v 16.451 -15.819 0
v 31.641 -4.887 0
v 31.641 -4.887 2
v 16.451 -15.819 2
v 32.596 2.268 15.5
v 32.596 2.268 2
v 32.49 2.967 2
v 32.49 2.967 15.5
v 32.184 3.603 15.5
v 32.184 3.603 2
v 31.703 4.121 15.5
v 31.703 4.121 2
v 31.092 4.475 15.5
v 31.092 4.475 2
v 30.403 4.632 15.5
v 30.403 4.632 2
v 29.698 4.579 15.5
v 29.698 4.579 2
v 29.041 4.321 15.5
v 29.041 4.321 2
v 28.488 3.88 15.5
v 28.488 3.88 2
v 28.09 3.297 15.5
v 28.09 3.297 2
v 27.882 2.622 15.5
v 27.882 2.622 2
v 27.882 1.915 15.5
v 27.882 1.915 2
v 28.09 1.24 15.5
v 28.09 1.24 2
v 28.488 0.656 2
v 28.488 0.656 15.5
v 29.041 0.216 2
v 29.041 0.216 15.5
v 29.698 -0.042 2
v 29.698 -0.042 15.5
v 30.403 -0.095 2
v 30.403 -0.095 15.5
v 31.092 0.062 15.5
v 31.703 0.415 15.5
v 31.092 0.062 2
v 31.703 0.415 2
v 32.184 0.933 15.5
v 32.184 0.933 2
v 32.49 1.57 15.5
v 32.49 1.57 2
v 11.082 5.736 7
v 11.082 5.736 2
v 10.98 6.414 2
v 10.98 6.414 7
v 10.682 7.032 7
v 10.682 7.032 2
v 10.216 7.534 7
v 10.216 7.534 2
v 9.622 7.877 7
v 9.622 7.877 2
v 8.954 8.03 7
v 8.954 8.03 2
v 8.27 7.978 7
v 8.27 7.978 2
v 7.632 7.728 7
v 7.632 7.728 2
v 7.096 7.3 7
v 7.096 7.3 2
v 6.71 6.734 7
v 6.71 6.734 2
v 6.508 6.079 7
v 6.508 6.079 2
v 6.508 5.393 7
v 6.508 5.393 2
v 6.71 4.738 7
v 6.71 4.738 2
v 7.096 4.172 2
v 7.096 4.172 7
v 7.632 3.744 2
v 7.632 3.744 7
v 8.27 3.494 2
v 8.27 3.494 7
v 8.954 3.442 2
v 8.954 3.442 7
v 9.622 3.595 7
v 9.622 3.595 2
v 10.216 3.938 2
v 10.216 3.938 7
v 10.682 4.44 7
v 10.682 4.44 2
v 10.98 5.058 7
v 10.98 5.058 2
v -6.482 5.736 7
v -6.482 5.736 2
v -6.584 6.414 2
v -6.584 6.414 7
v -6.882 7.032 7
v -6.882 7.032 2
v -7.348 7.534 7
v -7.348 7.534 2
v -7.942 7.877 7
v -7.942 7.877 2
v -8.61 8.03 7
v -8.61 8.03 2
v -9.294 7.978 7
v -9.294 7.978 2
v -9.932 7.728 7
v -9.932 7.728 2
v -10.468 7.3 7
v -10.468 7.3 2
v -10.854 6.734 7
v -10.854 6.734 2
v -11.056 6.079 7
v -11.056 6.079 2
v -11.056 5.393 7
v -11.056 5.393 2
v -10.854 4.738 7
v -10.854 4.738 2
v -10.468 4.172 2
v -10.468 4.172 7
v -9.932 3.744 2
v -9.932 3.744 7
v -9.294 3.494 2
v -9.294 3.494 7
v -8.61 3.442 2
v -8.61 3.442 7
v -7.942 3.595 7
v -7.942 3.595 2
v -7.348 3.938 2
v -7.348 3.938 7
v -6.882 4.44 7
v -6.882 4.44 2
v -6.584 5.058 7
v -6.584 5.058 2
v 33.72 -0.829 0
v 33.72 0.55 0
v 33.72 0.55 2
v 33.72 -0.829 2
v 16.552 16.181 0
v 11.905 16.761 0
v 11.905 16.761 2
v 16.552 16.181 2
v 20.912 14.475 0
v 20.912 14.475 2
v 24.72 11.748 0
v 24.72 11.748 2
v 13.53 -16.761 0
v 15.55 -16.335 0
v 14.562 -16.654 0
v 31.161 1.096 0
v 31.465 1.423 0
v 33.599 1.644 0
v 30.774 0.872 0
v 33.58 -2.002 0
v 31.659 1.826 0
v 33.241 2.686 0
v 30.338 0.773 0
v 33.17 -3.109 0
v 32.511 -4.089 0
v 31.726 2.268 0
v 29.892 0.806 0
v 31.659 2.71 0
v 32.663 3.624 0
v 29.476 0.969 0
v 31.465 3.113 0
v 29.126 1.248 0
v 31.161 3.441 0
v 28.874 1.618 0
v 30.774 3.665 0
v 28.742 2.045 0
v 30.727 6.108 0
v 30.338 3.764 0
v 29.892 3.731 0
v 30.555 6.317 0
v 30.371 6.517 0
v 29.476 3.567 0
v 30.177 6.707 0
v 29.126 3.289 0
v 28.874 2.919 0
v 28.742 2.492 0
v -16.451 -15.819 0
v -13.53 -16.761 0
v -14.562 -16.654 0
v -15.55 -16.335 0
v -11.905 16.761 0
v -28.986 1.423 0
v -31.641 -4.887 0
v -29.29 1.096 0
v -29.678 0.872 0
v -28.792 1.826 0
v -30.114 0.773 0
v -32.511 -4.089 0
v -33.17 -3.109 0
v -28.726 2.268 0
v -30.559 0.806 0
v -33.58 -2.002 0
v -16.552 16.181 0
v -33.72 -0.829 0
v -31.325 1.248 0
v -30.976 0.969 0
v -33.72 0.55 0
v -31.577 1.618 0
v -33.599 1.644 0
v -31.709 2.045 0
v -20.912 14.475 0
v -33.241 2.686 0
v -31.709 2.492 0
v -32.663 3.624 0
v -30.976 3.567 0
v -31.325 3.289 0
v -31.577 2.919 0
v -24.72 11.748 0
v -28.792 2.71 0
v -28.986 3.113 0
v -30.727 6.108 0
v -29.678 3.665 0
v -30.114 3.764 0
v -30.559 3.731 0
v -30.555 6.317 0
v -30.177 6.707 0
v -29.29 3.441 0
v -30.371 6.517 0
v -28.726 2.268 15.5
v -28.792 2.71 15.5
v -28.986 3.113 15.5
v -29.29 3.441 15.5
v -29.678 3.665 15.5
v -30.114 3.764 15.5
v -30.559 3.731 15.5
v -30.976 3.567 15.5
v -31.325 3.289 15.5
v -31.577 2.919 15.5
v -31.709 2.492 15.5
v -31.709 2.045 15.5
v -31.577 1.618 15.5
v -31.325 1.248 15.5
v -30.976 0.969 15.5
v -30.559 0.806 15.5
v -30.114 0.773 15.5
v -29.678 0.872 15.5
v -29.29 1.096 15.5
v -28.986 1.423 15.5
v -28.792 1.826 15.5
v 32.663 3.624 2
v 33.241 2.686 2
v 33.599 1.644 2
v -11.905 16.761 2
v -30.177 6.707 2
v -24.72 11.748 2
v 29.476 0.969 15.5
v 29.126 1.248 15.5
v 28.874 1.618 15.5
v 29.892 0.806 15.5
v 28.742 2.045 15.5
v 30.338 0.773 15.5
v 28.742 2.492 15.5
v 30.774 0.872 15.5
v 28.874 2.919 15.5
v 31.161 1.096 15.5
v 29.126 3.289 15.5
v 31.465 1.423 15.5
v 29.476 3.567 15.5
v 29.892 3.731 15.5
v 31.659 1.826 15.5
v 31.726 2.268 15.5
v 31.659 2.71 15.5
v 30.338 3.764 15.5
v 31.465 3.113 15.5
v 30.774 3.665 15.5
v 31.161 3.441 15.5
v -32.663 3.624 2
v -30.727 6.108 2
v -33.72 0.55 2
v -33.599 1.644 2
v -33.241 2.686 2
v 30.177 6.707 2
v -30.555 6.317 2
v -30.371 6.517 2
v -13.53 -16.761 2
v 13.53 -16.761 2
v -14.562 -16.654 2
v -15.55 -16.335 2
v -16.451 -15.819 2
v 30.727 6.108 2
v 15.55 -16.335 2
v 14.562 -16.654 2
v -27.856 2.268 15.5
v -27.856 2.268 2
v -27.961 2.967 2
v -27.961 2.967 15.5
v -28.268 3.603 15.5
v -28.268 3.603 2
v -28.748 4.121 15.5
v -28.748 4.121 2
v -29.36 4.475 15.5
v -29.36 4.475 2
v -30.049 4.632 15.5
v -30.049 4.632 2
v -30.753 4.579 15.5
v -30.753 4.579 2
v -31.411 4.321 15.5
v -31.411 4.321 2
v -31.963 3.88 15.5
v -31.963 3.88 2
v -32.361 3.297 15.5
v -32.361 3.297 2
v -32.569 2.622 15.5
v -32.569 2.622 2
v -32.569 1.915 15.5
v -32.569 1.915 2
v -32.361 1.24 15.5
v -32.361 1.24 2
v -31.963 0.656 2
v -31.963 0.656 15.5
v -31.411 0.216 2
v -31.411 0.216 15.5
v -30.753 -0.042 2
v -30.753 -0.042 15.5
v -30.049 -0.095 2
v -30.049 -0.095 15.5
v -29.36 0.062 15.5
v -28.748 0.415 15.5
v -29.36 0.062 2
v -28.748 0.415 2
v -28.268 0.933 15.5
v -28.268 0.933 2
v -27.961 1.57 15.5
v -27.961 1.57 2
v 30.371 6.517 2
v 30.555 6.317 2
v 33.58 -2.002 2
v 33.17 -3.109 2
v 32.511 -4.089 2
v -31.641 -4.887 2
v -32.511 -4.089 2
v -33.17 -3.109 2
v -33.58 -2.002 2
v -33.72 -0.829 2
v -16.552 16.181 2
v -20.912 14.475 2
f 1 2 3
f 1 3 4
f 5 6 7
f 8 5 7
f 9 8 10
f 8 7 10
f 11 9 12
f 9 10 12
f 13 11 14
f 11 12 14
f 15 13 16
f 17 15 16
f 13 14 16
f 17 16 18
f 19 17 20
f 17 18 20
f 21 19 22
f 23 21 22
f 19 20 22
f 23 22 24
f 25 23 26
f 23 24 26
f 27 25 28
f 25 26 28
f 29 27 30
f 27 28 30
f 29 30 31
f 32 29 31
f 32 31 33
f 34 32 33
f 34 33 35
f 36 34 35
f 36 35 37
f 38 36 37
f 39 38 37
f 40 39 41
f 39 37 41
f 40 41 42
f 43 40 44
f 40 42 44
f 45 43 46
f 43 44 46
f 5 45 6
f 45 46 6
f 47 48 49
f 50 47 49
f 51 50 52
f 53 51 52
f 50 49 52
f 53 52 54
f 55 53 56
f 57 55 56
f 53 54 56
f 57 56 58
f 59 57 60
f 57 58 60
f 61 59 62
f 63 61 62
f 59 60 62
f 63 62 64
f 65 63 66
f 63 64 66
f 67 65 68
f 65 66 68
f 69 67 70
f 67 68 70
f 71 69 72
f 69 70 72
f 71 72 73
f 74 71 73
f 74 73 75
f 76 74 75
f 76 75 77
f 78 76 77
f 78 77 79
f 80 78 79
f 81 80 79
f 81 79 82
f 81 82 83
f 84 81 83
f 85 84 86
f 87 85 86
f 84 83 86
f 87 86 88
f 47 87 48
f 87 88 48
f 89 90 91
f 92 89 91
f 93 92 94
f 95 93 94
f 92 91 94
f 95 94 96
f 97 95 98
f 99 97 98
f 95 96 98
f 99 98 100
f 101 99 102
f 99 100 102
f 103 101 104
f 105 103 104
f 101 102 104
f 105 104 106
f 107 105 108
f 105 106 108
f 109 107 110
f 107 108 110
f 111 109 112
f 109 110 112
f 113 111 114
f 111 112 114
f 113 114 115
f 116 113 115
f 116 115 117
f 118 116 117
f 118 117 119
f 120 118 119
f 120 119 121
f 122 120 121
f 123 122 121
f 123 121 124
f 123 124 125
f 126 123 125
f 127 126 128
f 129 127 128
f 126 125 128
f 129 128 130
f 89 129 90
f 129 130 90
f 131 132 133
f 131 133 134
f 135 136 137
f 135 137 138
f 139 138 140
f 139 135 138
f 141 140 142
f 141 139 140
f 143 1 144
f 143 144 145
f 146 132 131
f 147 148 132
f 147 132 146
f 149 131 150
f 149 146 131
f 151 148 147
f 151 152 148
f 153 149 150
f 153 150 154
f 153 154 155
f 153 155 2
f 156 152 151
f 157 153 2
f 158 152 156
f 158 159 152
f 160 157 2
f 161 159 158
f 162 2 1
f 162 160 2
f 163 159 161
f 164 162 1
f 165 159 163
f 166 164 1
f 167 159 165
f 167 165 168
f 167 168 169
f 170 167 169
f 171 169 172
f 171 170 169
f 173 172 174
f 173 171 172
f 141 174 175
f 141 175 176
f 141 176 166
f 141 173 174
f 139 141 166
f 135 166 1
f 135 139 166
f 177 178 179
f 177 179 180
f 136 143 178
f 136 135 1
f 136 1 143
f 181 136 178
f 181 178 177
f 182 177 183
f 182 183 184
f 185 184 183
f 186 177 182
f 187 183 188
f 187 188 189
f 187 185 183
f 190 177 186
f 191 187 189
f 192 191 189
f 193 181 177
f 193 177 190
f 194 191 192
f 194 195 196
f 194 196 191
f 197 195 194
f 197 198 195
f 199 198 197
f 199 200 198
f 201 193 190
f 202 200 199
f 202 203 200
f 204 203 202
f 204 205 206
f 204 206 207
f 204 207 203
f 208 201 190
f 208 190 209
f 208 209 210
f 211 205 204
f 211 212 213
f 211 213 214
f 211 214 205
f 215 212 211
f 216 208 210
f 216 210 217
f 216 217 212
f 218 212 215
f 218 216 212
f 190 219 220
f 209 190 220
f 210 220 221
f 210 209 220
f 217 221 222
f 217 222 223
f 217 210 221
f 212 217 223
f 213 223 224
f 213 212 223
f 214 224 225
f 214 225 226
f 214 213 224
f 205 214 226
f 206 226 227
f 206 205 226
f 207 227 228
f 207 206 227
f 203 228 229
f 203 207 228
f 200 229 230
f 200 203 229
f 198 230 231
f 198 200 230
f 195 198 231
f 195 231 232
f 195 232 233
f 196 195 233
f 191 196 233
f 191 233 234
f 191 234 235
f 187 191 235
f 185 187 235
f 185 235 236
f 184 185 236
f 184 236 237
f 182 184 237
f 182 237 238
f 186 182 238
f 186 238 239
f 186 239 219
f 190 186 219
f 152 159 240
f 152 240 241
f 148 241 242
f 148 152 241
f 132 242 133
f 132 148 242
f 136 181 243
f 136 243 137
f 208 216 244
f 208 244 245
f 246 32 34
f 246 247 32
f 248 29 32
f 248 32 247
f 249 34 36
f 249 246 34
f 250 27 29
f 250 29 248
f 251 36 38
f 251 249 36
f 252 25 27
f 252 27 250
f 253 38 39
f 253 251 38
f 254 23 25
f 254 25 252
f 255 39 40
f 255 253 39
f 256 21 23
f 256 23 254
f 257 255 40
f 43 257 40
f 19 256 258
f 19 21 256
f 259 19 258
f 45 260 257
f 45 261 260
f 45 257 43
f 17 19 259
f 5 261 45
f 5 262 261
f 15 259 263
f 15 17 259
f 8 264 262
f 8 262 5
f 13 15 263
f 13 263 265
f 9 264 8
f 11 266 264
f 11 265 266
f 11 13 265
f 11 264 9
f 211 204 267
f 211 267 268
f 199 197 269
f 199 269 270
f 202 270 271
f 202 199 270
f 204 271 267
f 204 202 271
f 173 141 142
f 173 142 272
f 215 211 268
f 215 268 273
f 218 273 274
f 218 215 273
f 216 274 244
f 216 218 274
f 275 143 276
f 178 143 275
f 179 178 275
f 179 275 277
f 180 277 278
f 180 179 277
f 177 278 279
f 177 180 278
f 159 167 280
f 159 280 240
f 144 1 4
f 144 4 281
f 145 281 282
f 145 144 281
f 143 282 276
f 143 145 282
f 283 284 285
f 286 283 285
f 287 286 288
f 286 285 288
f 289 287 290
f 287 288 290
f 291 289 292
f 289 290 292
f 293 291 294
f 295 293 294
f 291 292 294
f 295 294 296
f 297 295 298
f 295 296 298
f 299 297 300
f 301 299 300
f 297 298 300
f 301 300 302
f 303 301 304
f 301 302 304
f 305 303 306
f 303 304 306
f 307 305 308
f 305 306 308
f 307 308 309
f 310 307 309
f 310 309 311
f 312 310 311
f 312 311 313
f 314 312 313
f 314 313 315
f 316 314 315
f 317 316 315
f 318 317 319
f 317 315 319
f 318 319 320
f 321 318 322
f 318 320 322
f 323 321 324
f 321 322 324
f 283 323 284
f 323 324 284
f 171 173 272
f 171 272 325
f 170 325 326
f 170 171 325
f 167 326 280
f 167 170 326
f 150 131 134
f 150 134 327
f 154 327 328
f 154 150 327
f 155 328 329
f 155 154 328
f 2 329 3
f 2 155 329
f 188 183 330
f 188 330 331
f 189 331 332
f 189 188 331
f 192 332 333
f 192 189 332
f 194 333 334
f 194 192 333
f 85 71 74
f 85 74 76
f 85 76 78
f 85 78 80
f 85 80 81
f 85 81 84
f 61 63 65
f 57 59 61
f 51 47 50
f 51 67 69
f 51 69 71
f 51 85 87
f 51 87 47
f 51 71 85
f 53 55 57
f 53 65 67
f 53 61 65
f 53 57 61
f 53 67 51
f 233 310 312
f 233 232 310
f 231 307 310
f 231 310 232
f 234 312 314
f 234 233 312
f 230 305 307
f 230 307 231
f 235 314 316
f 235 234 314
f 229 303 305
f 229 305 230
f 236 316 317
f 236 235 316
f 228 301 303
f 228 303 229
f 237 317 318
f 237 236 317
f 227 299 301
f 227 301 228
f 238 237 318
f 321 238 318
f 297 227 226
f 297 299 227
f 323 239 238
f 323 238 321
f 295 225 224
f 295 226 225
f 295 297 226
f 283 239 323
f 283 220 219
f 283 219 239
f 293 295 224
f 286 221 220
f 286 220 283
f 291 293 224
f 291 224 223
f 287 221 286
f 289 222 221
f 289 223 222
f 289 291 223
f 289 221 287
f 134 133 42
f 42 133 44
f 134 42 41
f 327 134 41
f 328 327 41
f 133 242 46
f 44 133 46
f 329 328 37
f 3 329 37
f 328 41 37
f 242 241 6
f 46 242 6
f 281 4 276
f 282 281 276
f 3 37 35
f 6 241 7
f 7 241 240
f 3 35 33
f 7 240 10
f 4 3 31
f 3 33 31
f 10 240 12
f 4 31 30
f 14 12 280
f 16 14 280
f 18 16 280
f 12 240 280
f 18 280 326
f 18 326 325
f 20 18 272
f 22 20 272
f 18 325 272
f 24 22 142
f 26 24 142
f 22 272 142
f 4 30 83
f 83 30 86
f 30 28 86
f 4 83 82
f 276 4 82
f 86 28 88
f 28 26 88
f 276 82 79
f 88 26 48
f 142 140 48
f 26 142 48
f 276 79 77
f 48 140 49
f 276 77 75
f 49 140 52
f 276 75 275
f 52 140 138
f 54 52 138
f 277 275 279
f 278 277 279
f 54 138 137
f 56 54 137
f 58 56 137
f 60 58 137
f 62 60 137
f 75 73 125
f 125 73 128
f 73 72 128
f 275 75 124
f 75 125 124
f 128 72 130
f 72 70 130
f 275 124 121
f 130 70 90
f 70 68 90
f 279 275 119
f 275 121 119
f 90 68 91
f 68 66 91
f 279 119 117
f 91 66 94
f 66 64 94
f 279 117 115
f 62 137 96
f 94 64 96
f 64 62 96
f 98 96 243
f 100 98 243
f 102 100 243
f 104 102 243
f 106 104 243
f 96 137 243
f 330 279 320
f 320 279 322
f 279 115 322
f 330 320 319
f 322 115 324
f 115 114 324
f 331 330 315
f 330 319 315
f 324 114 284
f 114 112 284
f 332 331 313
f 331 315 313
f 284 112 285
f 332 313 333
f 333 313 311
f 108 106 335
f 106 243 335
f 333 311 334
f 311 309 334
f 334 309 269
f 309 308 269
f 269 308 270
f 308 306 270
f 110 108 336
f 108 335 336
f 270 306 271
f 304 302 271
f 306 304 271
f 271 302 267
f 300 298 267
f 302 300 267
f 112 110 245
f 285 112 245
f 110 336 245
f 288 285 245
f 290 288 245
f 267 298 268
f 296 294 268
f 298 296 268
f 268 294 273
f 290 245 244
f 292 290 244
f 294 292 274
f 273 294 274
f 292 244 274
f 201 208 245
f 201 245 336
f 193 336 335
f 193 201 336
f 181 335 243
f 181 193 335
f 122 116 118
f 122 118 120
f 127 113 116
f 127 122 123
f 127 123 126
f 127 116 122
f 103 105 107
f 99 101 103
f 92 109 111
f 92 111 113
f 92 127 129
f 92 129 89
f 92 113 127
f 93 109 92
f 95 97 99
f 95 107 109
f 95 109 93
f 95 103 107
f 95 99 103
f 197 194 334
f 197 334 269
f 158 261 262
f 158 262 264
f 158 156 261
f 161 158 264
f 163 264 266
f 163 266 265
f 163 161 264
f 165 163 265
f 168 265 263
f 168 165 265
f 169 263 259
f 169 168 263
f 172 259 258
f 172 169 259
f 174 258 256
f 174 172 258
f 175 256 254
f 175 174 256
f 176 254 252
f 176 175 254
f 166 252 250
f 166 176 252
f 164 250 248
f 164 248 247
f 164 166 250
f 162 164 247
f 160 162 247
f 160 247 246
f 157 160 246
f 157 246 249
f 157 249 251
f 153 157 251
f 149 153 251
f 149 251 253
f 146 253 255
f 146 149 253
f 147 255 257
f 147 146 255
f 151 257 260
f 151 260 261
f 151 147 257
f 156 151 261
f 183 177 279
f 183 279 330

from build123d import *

# Parameters (mm, degrees)
ESQUISSE1_R             = 1.5
BOSS_EXTRU_3_DEPTH      = 2
BOSS_EXTRU_4_START      = -53.32
ESQUISSE2_R             = 2.3
BOSS_EXTRU_4_DEPTH      = 5
ESQUISSE3_R             = 1.5
ENL_V_MAT_EXTRU_1_DEPTH = 10
ESQUISSE4_R             = 2.37
ESQUISSE4_R_2           = 1.5
BOSS_EXTRU_5_DEPTH      = 13.5


with BuildPart() as part:
    # Esquisse1 → Boss.-Extru.3 (new body)
    with BuildSketch(Plane.XY):
        with BuildLine():
            Line((31.640550531, -4.887241018), (16.450544828, -15.819470843))
            ThreePointArc((16.450544828, -15.819470843), (15.064222472, -16.51996197), (13.529826111, -16.761219719))
            Line((13.529826111, -16.761219719), (-13.529826111, -16.761219719))
            ThreePointArc((-13.529826111, -16.761219719), (-15.064222472, -16.51996197), (-16.450544828, -15.819470843))
            Line((-16.450544828, -15.819470843), (-31.640550531, -4.887241018))
            ThreePointArc((-31.640550531, -4.887241018), (-33.169752802, -3.108946738), (-33.719831815, -0.828989895))
            Line((-33.719831815, -0.828989895), (-33.719831815, 0.549989061))
            ThreePointArc((-33.719831815, 0.549989061), (-33.448369589, 2.175083064), (-32.663459607, 3.623716413))
            Line((-32.663459607, 3.623716413), (-30.727499402, 6.107575779))
            ThreePointArc((-30.727499402, 6.107575779), (-30.464326323, 6.418261685), (-30.17674656, 6.706504084))
            Line((-30.17674656, 6.706504084), (-24.719522272, 11.748000297))
            ThreePointArc((-24.719522272, 11.748000297), (-18.785145606, 15.463312907), (-11.905042981, 16.761219719))
            Line((-11.905042981, 16.761219719), (11.905042981, 16.761219719))
            ThreePointArc((11.905042981, 16.761219719), (18.785145606, 15.463312907), (24.719522272, 11.748000297))
            Line((24.719522272, 11.748000297), (30.17674656, 6.706504084))
            ThreePointArc((30.17674656, 6.706504084), (30.464326323, 6.418261685), (30.727499402, 6.107575779))
            Line((30.727499402, 6.107575779), (32.663459607, 3.623716413))
            ThreePointArc((32.663459607, 3.623716413), (33.448369589, 2.175083064), (33.719831815, 0.549989061))
            Line((33.719831815, 0.549989061), (33.719831815, -0.828989895))
            ThreePointArc((33.719831815, -0.828989895), (33.169752802, -3.108946738), (31.640550531, -4.887241018))
        make_face()
        with Locations((-30.225692015, 2.268354752)):
            Circle(ESQUISSE1_R, mode=Mode.SUBTRACT)
        with Locations((30.225692015, 2.268354752)):
            Circle(ESQUISSE1_R, mode=Mode.SUBTRACT)
    extrude(amount=BOSS_EXTRU_3_DEPTH)

    # Esquisse2 → Boss.-Extru.4 (add)
    with BuildSketch(Plane.XY.offset(55.32).offset(BOSS_EXTRU_4_START)):
        with Locations((-8.781978503, 5.736063319)):
            Circle(ESQUISSE2_R)
        with Locations((8.782063878, 5.73606332)):
            Circle(ESQUISSE2_R)
    extrude(amount=BOSS_EXTRU_4_DEPTH)

    # Esquisse3 → Enlèv. mat.-Extru.1 (cut)
    with BuildSketch(Plane(origin=(0, 0, 0), x_dir=(-1, 0, 0), z_dir=(0, 0, -1))):
        with Locations((60.239561974, 19.762236701)):
            Circle(ESQUISSE3_R)
        with Locations((-29.955535999, 19.762236701)):
            Circle(ESQUISSE3_R)
    extrude(amount=-ENL_V_MAT_EXTRU_1_DEPTH, mode=Mode.SUBTRACT)

    # Esquisse4 → Boss.-Extru.5 (add)
    # profile 1 of 2: a face of its own
    with BuildSketch(Plane.XY.offset(2)):
        with Locations((30.225692015, 2.268354752)):
            Circle(ESQUISSE4_R)
        with Locations((30.225692015, 2.268354752)):
            Circle(ESQUISSE4_R_2, mode=Mode.SUBTRACT)
    # profile 2 of 2: a face of its own
    with BuildSketch(Plane.XY.offset(2)):
        with Locations((-30.225692015, 2.268354752)):
            Circle(ESQUISSE4_R)
        with Locations((-30.225692015, 2.268354752)):
            Circle(ESQUISSE4_R_2, mode=Mode.SUBTRACT)
    extrude(amount=BOSS_EXTRU_5_DEPTH)


solid = part.part
